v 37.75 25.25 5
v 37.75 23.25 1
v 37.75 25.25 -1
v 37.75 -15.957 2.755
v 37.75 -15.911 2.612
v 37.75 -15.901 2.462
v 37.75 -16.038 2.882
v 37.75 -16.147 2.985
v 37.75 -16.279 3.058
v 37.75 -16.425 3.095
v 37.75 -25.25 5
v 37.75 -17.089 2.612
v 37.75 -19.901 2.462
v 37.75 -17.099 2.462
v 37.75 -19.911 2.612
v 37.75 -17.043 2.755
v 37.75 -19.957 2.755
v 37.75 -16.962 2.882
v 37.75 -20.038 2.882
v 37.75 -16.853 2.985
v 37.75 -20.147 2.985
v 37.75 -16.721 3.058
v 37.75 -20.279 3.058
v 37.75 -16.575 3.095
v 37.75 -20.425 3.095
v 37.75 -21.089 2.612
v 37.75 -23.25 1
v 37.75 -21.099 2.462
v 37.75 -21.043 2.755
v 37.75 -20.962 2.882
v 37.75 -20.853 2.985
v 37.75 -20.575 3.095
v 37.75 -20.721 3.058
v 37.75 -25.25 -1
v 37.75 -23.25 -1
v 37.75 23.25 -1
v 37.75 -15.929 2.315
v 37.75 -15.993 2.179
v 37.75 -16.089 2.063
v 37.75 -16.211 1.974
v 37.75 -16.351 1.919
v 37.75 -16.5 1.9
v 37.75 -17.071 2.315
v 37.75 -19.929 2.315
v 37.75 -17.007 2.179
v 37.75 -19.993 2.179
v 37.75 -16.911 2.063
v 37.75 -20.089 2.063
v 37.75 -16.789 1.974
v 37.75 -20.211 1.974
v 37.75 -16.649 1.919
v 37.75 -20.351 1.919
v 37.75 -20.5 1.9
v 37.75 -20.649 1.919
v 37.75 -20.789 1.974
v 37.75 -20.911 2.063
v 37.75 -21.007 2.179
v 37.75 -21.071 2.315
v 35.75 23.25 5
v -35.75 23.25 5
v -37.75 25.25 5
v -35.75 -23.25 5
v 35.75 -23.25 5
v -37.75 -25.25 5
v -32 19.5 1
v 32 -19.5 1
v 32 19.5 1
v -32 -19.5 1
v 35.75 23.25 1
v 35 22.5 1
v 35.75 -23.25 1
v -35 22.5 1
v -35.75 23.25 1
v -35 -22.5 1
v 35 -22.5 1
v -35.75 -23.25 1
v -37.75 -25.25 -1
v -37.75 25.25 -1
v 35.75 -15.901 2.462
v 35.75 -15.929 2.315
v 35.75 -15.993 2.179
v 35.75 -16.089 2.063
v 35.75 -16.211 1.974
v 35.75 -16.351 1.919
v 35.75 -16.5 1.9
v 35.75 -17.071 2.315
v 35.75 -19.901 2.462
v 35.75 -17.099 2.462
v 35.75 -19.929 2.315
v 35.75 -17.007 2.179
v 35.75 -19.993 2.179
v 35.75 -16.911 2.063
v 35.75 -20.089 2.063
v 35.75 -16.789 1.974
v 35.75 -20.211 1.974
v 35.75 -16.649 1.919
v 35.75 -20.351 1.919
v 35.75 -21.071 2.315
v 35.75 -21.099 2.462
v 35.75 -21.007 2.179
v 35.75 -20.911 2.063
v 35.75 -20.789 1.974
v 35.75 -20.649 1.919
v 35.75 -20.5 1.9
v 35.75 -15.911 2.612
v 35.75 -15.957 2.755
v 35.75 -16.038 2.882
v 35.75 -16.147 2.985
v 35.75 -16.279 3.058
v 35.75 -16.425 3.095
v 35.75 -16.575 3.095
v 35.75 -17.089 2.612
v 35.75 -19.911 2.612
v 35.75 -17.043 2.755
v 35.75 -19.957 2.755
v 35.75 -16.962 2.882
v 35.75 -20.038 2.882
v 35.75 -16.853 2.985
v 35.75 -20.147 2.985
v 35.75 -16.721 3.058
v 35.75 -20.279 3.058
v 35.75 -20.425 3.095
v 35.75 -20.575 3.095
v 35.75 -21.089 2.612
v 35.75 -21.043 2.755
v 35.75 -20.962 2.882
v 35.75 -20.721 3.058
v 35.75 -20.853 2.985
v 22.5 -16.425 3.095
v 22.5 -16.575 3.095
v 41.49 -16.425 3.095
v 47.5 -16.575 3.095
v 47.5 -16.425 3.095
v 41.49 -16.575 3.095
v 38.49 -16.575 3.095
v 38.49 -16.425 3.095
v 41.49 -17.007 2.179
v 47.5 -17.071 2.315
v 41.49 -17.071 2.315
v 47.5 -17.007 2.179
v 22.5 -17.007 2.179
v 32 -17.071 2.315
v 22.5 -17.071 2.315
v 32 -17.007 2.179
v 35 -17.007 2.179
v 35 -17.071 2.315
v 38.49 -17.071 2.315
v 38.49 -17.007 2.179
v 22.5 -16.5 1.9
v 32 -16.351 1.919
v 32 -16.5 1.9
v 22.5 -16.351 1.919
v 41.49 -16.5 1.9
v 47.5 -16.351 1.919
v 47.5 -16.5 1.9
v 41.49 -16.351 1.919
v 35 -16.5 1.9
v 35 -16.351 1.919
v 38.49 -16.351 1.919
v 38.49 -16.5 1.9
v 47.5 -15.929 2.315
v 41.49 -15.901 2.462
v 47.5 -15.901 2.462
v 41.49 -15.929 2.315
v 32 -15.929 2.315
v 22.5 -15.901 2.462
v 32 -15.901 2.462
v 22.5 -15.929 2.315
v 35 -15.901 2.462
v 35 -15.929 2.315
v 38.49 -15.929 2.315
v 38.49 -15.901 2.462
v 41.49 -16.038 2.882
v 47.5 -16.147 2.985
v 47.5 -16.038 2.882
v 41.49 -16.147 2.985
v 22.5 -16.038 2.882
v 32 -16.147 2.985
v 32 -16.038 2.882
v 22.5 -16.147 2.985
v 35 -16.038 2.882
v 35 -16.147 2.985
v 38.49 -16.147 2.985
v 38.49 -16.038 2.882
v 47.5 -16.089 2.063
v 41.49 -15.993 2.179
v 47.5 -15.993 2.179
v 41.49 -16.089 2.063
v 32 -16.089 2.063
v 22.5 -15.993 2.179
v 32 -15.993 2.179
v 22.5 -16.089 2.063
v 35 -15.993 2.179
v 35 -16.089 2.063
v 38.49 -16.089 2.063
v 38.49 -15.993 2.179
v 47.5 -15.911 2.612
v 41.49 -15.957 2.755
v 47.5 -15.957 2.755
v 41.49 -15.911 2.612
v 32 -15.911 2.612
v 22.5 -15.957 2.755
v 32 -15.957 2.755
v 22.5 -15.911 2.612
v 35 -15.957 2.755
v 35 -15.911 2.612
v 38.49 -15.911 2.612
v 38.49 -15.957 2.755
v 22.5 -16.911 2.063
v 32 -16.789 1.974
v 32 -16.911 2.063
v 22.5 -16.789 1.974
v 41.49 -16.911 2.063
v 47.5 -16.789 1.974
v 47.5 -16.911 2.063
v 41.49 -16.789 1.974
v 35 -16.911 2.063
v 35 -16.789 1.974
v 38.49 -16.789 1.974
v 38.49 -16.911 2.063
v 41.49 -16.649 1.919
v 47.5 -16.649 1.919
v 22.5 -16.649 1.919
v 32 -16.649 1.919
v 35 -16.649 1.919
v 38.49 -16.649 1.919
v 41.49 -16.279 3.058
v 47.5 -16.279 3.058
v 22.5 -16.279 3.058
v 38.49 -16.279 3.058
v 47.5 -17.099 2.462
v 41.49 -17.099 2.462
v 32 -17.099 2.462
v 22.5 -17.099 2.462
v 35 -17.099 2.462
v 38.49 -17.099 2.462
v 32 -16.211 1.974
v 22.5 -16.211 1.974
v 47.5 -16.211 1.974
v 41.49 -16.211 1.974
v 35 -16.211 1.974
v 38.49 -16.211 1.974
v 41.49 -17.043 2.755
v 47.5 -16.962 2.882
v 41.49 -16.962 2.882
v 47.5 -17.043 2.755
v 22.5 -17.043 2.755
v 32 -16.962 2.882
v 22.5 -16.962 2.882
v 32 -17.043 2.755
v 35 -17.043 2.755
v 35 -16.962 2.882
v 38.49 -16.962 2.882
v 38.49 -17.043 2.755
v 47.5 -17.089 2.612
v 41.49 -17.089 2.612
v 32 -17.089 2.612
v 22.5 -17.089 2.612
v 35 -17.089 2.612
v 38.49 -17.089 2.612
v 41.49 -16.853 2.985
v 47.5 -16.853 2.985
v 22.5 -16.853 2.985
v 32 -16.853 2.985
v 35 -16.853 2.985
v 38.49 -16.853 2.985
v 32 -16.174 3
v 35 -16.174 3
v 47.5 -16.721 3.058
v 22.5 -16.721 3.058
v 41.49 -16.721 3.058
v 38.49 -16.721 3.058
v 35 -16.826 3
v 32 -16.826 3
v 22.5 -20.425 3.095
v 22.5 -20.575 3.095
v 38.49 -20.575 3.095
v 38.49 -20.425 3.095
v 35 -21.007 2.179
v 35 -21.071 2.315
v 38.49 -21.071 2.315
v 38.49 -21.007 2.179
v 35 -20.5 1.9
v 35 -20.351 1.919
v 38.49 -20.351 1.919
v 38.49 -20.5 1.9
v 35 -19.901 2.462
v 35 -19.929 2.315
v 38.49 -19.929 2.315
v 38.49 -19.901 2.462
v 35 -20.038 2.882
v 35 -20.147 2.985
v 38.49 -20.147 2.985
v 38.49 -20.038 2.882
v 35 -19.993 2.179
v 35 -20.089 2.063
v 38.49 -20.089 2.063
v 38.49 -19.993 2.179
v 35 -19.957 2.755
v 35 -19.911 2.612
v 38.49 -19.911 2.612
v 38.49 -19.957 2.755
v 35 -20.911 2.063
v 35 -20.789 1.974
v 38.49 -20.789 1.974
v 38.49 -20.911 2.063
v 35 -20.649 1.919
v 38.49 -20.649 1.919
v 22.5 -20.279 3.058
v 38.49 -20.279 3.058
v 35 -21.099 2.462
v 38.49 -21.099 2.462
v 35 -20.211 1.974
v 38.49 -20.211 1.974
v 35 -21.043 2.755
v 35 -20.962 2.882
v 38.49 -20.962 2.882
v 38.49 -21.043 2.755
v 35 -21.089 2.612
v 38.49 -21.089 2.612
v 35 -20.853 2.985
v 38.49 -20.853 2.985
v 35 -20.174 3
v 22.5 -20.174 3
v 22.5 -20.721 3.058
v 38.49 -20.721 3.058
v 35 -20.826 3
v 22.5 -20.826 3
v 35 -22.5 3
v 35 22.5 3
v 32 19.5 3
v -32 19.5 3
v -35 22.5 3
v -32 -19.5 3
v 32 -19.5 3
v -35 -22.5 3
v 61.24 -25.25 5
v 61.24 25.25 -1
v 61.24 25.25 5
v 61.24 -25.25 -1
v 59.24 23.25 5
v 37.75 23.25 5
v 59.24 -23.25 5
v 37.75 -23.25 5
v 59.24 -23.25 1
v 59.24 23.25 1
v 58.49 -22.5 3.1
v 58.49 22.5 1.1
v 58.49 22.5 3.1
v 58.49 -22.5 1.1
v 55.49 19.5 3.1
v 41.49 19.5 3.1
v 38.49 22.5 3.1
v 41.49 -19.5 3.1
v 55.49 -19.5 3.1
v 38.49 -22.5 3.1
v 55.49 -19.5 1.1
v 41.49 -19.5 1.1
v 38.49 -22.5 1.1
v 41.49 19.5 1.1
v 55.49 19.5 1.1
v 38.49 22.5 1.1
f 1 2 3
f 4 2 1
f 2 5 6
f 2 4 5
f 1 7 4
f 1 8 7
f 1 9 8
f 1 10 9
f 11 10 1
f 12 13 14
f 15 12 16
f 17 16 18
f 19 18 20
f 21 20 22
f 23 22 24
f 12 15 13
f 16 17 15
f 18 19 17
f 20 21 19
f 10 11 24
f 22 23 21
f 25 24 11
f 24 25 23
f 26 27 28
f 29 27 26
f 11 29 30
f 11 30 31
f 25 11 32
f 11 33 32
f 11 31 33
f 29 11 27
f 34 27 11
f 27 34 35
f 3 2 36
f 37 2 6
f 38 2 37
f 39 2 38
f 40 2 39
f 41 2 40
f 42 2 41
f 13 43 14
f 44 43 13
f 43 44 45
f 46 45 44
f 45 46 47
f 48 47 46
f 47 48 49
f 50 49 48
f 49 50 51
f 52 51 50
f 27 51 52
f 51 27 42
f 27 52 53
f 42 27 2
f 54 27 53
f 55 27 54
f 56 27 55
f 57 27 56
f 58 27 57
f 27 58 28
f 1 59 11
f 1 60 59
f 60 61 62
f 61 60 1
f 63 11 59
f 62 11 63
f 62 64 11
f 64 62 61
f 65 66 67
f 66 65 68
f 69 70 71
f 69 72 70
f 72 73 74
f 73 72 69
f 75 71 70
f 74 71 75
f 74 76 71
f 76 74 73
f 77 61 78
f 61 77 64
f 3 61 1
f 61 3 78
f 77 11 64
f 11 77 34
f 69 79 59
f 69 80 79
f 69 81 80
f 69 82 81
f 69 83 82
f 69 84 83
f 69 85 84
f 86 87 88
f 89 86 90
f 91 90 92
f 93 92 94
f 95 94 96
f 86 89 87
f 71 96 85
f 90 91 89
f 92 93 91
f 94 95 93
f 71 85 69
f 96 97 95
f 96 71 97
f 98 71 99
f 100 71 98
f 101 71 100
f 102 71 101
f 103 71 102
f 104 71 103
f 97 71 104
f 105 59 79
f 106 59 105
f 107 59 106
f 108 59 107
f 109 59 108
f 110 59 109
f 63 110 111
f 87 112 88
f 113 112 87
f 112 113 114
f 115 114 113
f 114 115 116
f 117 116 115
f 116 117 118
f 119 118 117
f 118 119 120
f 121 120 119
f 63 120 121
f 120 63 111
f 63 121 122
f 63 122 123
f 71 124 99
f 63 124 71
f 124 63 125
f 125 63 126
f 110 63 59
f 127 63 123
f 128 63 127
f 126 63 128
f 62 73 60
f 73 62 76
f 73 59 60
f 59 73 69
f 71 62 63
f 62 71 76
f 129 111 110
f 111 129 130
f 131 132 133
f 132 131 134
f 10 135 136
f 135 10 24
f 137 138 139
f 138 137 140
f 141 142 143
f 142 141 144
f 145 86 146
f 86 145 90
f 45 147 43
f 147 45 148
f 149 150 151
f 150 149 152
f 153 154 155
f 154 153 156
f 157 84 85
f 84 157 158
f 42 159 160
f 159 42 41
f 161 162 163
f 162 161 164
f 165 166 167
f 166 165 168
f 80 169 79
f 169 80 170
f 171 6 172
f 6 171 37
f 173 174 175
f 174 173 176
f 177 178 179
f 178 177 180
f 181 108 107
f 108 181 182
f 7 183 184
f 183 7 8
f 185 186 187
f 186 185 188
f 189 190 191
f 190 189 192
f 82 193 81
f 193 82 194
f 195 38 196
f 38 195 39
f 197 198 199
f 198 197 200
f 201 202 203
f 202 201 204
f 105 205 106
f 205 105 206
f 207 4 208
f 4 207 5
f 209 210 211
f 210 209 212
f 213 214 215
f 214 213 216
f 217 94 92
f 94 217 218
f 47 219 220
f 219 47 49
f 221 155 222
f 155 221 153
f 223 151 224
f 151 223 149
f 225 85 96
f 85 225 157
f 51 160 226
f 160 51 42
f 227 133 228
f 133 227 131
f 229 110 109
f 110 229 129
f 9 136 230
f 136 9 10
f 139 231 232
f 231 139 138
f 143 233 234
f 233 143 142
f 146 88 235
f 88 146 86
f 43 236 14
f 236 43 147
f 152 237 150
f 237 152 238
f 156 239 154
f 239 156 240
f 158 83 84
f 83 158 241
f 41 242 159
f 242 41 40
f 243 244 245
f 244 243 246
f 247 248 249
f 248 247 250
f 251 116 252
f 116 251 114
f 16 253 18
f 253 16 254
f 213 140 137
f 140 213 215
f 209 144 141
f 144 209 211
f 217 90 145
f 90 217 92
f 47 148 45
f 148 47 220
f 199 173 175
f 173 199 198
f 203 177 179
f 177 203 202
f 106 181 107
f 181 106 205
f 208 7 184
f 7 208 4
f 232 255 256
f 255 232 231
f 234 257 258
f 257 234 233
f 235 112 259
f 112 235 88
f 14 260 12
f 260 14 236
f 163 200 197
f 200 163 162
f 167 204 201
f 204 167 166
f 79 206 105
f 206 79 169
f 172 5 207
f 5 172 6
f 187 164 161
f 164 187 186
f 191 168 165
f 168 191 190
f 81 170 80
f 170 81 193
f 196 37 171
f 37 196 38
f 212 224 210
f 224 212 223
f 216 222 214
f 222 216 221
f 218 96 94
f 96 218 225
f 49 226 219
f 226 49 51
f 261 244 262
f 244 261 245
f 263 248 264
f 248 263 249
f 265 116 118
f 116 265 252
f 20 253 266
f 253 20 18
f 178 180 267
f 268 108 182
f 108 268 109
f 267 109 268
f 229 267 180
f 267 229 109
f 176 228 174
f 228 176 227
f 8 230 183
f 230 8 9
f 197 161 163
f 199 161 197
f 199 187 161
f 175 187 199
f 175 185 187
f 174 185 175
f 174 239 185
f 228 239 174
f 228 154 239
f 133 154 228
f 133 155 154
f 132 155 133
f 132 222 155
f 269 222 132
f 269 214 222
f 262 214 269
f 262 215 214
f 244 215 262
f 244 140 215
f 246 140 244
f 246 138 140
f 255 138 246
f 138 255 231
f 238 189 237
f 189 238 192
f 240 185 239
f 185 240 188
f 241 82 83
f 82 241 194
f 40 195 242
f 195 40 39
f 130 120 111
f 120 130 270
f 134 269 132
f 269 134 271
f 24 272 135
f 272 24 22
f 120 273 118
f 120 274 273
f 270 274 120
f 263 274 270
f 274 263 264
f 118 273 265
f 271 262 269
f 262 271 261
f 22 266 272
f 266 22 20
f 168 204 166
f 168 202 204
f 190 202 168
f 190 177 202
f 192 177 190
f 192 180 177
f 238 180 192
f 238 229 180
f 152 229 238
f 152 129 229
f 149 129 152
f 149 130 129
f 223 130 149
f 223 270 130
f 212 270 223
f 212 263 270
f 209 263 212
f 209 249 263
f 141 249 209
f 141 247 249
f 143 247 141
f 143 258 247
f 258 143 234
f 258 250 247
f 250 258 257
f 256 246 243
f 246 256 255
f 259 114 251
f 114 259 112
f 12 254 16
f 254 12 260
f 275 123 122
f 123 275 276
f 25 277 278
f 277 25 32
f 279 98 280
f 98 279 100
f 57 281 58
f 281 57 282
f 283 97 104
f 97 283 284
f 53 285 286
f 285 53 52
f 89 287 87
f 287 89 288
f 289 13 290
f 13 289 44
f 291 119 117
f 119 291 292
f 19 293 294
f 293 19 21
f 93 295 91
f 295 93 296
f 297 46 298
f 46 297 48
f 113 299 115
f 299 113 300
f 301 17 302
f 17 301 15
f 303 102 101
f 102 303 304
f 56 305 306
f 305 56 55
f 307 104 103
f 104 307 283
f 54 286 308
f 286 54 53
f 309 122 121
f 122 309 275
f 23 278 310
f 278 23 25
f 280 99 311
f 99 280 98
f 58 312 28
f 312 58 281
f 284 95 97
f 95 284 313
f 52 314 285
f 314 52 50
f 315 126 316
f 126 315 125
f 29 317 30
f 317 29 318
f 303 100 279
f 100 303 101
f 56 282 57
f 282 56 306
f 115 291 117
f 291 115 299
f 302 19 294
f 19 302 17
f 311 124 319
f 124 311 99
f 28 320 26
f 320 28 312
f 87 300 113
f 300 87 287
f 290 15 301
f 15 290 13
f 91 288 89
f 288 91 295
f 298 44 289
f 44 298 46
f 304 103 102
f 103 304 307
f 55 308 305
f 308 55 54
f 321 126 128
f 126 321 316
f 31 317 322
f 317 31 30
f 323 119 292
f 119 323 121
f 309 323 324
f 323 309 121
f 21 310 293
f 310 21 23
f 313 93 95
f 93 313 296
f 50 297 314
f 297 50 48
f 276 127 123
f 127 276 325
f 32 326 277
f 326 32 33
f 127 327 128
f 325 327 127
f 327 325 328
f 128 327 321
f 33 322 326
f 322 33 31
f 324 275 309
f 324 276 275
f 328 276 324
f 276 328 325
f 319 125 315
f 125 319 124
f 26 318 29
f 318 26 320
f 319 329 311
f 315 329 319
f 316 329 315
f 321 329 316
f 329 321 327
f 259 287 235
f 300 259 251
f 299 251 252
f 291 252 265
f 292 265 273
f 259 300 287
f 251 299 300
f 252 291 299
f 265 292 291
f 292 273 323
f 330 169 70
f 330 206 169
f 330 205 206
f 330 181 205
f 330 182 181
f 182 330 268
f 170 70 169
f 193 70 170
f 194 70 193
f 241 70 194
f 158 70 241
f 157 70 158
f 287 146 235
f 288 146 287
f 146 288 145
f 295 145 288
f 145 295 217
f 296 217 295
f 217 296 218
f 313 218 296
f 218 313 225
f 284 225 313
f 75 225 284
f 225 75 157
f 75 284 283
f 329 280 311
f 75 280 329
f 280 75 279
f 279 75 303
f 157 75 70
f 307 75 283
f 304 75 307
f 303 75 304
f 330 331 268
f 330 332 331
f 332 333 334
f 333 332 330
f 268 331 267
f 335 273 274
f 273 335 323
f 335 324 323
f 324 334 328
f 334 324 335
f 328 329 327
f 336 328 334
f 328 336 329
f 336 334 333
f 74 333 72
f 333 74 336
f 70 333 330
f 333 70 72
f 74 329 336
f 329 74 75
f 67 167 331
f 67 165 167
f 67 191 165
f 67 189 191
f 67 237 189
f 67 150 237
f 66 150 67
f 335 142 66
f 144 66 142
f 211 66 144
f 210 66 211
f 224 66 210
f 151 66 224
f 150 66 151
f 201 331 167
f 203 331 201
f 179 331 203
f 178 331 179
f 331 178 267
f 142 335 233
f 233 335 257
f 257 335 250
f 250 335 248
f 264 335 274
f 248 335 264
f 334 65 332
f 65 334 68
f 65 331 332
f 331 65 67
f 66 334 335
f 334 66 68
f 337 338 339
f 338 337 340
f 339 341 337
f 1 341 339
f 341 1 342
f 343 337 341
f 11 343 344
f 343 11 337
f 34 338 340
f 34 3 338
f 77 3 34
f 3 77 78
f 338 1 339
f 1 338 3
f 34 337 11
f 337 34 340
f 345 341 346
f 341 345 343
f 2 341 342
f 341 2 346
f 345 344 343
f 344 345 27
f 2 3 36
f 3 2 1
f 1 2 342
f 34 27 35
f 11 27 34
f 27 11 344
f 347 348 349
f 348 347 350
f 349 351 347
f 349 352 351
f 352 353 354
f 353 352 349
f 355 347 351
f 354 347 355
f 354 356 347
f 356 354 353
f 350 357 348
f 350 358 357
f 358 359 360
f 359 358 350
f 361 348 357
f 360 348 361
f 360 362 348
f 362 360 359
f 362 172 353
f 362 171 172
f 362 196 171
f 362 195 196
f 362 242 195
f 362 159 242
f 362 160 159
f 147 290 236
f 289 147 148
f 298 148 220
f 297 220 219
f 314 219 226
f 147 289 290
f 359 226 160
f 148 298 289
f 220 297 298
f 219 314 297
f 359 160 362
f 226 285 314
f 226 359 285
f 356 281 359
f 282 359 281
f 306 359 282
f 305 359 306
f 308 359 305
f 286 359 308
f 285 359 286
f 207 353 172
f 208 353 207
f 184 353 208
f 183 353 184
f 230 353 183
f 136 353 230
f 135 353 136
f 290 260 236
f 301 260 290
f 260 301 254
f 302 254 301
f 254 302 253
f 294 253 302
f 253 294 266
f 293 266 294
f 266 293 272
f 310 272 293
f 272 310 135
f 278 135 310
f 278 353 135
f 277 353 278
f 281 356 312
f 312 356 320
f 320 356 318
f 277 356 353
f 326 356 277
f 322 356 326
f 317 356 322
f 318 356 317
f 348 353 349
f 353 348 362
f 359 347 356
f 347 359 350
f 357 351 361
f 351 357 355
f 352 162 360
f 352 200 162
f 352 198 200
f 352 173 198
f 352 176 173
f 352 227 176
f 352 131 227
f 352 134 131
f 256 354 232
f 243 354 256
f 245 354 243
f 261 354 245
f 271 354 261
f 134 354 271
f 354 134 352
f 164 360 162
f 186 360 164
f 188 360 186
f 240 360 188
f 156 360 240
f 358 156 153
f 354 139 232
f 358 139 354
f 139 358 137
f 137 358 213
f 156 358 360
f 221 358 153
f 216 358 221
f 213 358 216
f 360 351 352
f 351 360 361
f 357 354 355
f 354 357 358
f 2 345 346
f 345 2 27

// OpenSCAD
// file: controller.scad
w_back = 70;
h_back = 45;
w_controller = 20;
thickness_bottom = 2;
thickness_walls = 2;
h_walls = 4;
gap_backlight = 1.5;
thickness_top = 2;
thickness_back = 1;
width_frame_window = 3;

kit_controller();
//walls();
//debug_controller();



module frame_controller(){
difference(){
    cube([w_controller, h_back, thickness_top], center = true);
    color("red")
    cube([w_controller-2*width_frame_window, h_back-2*width_frame_window, thickness_top+1], center = true);
}
}

module debug_controller() {
    difference(){
        kit_controller();
        translate([-w_controller/2, 0, h_walls/2])
        color("green")
        cube([w_controller, h_back+2*thickness_walls+1+gap_backlight, h_walls*2], center = true);
    }
}


module kit_controller(){
    controller();
    translate([0, 0, h_walls/2])
    walls();
    color("green")
    translate([0, 0, thickness_bottom+0.1])
    frame_controller();
}
module walls(){
    difference(){
        cube([w_controller+2*thickness_walls+gap_backlight, h_back+2*thickness_walls+gap_backlight, thickness_bottom+h_walls], center=true);
        color("red")
        cube([w_controller+gap_backlight, h_back+gap_backlight, thickness_bottom+h_walls+1], center=true);
        translate([-w_controller-thickness_walls+gap_backlight/2-0.24, 0, 0])
        color("red")
        cube([w_controller+gap_backlight, h_back+gap_backlight+2*thickness_walls+1, thickness_bottom+h_walls+1], center=true);
    }
}

module controller(){
    cube([w_controller+gap_backlight, h_back+gap_backlight, thickness_bottom], center=true);
}
// file: akkum_18650.scad
echo("Работа Огорельцева Тимура");

d_akkum = 18;
h_akkum = 65;

twoAcc();

module twoAcc() {
translate([0, -d_akkum/2-1, d_akkum/2+1])
rotate([0, 90, 0])
akkum18650();
    
translate([0, d_akkum/2+1, d_akkum/2+1])
rotate([0, 90, 0])
akkum18650();
    
translate([-33, -10, 0])
import("flexbatter18650x2.stl");
}

module akkum18650(){
    color("purple")
    cylinder(d=d_akkum, h=h_akkum, $fn=32, center = true);
}
// main file
use <akkum_18650.scad>
use <controller.scad>

echo("Работа Огорельцева Тимура");

thickness_frame = 4;
thickness_walls = 2;
thickness_bottom = 2;
thickness_top = 2;
width_frame_window = 3;

w_controller = 20;

w_back = 70;
h_back = 45;

thickness_back = 1;
h_walls = 4;
d_wires = 1.2;

d_akkum = 18;
h_akkum = 65;

gap_backlight = 1.5;


kit_frame();


//translate([1, 0, 0])
//debug_controller();
//frame_debug();

//translate([0, 0, thickness_bottom/2+thickness_top/2])
//window_frame();
//walls();

module window_frame(){
    difference(){
        color("green")
        cube([w_back, h_back, thickness_top], center = true);
        color("red")
        cube([w_back-width_frame_window*2, h_back-width_frame_window*2, thickness_top+1], center = true);
    }
}

module frame_debug(){
    difference(){
    kit_frame();
    translate([w_back/2, 0, h_walls-thickness_bottom])
    cube([w_back, h_back+2*thickness_walls+2, h_walls*2], center = true);
    }
}

module kit_frame(){
    bottom();
    translate([0,0,h_walls/2+thickness_bottom/2])
    walls();
    wires();
    translate([0, 0, thickness_bottom/2+thickness_top/2])
    window_frame();
    translate([w_back/2+w_controller/2+2*thickness_walls-0.51, 0, 0])
    kit_controller();
}

module wires() {
    translate([w_back/2, -h_back/2+6, h_walls/2+0.5])
    rotate([0, 90, 0])
    color("red")
    cylinder(d=d_wires, h=25, center=true, $fn=25);
    
    translate([w_back/2, -h_back/2+2, h_walls/2+0.5])
    rotate([0, 90, 0])
    color("black")
    cylinder(d=d_wires, h=25, center=true, $fn=25);
}

module walls(){
    difference(){
        cube([w_back+2*thickness_walls+gap_backlight, h_back+2*thickness_walls+gap_backlight, h_walls], center = true);
        color("red")
        cube([w_back+gap_backlight, h_back+gap_backlight, h_walls+1], center = true);
    }
}
module backlight(){
    color("lightgreen")
    cube([w_back, h_back, thickness_back], center = true);
}

module bottom(){
    cube([w_back+2*thickness_walls+gap_backlight, h_back+2*thickness_walls+gap_backlight, thickness_bottom], center = true);
}
